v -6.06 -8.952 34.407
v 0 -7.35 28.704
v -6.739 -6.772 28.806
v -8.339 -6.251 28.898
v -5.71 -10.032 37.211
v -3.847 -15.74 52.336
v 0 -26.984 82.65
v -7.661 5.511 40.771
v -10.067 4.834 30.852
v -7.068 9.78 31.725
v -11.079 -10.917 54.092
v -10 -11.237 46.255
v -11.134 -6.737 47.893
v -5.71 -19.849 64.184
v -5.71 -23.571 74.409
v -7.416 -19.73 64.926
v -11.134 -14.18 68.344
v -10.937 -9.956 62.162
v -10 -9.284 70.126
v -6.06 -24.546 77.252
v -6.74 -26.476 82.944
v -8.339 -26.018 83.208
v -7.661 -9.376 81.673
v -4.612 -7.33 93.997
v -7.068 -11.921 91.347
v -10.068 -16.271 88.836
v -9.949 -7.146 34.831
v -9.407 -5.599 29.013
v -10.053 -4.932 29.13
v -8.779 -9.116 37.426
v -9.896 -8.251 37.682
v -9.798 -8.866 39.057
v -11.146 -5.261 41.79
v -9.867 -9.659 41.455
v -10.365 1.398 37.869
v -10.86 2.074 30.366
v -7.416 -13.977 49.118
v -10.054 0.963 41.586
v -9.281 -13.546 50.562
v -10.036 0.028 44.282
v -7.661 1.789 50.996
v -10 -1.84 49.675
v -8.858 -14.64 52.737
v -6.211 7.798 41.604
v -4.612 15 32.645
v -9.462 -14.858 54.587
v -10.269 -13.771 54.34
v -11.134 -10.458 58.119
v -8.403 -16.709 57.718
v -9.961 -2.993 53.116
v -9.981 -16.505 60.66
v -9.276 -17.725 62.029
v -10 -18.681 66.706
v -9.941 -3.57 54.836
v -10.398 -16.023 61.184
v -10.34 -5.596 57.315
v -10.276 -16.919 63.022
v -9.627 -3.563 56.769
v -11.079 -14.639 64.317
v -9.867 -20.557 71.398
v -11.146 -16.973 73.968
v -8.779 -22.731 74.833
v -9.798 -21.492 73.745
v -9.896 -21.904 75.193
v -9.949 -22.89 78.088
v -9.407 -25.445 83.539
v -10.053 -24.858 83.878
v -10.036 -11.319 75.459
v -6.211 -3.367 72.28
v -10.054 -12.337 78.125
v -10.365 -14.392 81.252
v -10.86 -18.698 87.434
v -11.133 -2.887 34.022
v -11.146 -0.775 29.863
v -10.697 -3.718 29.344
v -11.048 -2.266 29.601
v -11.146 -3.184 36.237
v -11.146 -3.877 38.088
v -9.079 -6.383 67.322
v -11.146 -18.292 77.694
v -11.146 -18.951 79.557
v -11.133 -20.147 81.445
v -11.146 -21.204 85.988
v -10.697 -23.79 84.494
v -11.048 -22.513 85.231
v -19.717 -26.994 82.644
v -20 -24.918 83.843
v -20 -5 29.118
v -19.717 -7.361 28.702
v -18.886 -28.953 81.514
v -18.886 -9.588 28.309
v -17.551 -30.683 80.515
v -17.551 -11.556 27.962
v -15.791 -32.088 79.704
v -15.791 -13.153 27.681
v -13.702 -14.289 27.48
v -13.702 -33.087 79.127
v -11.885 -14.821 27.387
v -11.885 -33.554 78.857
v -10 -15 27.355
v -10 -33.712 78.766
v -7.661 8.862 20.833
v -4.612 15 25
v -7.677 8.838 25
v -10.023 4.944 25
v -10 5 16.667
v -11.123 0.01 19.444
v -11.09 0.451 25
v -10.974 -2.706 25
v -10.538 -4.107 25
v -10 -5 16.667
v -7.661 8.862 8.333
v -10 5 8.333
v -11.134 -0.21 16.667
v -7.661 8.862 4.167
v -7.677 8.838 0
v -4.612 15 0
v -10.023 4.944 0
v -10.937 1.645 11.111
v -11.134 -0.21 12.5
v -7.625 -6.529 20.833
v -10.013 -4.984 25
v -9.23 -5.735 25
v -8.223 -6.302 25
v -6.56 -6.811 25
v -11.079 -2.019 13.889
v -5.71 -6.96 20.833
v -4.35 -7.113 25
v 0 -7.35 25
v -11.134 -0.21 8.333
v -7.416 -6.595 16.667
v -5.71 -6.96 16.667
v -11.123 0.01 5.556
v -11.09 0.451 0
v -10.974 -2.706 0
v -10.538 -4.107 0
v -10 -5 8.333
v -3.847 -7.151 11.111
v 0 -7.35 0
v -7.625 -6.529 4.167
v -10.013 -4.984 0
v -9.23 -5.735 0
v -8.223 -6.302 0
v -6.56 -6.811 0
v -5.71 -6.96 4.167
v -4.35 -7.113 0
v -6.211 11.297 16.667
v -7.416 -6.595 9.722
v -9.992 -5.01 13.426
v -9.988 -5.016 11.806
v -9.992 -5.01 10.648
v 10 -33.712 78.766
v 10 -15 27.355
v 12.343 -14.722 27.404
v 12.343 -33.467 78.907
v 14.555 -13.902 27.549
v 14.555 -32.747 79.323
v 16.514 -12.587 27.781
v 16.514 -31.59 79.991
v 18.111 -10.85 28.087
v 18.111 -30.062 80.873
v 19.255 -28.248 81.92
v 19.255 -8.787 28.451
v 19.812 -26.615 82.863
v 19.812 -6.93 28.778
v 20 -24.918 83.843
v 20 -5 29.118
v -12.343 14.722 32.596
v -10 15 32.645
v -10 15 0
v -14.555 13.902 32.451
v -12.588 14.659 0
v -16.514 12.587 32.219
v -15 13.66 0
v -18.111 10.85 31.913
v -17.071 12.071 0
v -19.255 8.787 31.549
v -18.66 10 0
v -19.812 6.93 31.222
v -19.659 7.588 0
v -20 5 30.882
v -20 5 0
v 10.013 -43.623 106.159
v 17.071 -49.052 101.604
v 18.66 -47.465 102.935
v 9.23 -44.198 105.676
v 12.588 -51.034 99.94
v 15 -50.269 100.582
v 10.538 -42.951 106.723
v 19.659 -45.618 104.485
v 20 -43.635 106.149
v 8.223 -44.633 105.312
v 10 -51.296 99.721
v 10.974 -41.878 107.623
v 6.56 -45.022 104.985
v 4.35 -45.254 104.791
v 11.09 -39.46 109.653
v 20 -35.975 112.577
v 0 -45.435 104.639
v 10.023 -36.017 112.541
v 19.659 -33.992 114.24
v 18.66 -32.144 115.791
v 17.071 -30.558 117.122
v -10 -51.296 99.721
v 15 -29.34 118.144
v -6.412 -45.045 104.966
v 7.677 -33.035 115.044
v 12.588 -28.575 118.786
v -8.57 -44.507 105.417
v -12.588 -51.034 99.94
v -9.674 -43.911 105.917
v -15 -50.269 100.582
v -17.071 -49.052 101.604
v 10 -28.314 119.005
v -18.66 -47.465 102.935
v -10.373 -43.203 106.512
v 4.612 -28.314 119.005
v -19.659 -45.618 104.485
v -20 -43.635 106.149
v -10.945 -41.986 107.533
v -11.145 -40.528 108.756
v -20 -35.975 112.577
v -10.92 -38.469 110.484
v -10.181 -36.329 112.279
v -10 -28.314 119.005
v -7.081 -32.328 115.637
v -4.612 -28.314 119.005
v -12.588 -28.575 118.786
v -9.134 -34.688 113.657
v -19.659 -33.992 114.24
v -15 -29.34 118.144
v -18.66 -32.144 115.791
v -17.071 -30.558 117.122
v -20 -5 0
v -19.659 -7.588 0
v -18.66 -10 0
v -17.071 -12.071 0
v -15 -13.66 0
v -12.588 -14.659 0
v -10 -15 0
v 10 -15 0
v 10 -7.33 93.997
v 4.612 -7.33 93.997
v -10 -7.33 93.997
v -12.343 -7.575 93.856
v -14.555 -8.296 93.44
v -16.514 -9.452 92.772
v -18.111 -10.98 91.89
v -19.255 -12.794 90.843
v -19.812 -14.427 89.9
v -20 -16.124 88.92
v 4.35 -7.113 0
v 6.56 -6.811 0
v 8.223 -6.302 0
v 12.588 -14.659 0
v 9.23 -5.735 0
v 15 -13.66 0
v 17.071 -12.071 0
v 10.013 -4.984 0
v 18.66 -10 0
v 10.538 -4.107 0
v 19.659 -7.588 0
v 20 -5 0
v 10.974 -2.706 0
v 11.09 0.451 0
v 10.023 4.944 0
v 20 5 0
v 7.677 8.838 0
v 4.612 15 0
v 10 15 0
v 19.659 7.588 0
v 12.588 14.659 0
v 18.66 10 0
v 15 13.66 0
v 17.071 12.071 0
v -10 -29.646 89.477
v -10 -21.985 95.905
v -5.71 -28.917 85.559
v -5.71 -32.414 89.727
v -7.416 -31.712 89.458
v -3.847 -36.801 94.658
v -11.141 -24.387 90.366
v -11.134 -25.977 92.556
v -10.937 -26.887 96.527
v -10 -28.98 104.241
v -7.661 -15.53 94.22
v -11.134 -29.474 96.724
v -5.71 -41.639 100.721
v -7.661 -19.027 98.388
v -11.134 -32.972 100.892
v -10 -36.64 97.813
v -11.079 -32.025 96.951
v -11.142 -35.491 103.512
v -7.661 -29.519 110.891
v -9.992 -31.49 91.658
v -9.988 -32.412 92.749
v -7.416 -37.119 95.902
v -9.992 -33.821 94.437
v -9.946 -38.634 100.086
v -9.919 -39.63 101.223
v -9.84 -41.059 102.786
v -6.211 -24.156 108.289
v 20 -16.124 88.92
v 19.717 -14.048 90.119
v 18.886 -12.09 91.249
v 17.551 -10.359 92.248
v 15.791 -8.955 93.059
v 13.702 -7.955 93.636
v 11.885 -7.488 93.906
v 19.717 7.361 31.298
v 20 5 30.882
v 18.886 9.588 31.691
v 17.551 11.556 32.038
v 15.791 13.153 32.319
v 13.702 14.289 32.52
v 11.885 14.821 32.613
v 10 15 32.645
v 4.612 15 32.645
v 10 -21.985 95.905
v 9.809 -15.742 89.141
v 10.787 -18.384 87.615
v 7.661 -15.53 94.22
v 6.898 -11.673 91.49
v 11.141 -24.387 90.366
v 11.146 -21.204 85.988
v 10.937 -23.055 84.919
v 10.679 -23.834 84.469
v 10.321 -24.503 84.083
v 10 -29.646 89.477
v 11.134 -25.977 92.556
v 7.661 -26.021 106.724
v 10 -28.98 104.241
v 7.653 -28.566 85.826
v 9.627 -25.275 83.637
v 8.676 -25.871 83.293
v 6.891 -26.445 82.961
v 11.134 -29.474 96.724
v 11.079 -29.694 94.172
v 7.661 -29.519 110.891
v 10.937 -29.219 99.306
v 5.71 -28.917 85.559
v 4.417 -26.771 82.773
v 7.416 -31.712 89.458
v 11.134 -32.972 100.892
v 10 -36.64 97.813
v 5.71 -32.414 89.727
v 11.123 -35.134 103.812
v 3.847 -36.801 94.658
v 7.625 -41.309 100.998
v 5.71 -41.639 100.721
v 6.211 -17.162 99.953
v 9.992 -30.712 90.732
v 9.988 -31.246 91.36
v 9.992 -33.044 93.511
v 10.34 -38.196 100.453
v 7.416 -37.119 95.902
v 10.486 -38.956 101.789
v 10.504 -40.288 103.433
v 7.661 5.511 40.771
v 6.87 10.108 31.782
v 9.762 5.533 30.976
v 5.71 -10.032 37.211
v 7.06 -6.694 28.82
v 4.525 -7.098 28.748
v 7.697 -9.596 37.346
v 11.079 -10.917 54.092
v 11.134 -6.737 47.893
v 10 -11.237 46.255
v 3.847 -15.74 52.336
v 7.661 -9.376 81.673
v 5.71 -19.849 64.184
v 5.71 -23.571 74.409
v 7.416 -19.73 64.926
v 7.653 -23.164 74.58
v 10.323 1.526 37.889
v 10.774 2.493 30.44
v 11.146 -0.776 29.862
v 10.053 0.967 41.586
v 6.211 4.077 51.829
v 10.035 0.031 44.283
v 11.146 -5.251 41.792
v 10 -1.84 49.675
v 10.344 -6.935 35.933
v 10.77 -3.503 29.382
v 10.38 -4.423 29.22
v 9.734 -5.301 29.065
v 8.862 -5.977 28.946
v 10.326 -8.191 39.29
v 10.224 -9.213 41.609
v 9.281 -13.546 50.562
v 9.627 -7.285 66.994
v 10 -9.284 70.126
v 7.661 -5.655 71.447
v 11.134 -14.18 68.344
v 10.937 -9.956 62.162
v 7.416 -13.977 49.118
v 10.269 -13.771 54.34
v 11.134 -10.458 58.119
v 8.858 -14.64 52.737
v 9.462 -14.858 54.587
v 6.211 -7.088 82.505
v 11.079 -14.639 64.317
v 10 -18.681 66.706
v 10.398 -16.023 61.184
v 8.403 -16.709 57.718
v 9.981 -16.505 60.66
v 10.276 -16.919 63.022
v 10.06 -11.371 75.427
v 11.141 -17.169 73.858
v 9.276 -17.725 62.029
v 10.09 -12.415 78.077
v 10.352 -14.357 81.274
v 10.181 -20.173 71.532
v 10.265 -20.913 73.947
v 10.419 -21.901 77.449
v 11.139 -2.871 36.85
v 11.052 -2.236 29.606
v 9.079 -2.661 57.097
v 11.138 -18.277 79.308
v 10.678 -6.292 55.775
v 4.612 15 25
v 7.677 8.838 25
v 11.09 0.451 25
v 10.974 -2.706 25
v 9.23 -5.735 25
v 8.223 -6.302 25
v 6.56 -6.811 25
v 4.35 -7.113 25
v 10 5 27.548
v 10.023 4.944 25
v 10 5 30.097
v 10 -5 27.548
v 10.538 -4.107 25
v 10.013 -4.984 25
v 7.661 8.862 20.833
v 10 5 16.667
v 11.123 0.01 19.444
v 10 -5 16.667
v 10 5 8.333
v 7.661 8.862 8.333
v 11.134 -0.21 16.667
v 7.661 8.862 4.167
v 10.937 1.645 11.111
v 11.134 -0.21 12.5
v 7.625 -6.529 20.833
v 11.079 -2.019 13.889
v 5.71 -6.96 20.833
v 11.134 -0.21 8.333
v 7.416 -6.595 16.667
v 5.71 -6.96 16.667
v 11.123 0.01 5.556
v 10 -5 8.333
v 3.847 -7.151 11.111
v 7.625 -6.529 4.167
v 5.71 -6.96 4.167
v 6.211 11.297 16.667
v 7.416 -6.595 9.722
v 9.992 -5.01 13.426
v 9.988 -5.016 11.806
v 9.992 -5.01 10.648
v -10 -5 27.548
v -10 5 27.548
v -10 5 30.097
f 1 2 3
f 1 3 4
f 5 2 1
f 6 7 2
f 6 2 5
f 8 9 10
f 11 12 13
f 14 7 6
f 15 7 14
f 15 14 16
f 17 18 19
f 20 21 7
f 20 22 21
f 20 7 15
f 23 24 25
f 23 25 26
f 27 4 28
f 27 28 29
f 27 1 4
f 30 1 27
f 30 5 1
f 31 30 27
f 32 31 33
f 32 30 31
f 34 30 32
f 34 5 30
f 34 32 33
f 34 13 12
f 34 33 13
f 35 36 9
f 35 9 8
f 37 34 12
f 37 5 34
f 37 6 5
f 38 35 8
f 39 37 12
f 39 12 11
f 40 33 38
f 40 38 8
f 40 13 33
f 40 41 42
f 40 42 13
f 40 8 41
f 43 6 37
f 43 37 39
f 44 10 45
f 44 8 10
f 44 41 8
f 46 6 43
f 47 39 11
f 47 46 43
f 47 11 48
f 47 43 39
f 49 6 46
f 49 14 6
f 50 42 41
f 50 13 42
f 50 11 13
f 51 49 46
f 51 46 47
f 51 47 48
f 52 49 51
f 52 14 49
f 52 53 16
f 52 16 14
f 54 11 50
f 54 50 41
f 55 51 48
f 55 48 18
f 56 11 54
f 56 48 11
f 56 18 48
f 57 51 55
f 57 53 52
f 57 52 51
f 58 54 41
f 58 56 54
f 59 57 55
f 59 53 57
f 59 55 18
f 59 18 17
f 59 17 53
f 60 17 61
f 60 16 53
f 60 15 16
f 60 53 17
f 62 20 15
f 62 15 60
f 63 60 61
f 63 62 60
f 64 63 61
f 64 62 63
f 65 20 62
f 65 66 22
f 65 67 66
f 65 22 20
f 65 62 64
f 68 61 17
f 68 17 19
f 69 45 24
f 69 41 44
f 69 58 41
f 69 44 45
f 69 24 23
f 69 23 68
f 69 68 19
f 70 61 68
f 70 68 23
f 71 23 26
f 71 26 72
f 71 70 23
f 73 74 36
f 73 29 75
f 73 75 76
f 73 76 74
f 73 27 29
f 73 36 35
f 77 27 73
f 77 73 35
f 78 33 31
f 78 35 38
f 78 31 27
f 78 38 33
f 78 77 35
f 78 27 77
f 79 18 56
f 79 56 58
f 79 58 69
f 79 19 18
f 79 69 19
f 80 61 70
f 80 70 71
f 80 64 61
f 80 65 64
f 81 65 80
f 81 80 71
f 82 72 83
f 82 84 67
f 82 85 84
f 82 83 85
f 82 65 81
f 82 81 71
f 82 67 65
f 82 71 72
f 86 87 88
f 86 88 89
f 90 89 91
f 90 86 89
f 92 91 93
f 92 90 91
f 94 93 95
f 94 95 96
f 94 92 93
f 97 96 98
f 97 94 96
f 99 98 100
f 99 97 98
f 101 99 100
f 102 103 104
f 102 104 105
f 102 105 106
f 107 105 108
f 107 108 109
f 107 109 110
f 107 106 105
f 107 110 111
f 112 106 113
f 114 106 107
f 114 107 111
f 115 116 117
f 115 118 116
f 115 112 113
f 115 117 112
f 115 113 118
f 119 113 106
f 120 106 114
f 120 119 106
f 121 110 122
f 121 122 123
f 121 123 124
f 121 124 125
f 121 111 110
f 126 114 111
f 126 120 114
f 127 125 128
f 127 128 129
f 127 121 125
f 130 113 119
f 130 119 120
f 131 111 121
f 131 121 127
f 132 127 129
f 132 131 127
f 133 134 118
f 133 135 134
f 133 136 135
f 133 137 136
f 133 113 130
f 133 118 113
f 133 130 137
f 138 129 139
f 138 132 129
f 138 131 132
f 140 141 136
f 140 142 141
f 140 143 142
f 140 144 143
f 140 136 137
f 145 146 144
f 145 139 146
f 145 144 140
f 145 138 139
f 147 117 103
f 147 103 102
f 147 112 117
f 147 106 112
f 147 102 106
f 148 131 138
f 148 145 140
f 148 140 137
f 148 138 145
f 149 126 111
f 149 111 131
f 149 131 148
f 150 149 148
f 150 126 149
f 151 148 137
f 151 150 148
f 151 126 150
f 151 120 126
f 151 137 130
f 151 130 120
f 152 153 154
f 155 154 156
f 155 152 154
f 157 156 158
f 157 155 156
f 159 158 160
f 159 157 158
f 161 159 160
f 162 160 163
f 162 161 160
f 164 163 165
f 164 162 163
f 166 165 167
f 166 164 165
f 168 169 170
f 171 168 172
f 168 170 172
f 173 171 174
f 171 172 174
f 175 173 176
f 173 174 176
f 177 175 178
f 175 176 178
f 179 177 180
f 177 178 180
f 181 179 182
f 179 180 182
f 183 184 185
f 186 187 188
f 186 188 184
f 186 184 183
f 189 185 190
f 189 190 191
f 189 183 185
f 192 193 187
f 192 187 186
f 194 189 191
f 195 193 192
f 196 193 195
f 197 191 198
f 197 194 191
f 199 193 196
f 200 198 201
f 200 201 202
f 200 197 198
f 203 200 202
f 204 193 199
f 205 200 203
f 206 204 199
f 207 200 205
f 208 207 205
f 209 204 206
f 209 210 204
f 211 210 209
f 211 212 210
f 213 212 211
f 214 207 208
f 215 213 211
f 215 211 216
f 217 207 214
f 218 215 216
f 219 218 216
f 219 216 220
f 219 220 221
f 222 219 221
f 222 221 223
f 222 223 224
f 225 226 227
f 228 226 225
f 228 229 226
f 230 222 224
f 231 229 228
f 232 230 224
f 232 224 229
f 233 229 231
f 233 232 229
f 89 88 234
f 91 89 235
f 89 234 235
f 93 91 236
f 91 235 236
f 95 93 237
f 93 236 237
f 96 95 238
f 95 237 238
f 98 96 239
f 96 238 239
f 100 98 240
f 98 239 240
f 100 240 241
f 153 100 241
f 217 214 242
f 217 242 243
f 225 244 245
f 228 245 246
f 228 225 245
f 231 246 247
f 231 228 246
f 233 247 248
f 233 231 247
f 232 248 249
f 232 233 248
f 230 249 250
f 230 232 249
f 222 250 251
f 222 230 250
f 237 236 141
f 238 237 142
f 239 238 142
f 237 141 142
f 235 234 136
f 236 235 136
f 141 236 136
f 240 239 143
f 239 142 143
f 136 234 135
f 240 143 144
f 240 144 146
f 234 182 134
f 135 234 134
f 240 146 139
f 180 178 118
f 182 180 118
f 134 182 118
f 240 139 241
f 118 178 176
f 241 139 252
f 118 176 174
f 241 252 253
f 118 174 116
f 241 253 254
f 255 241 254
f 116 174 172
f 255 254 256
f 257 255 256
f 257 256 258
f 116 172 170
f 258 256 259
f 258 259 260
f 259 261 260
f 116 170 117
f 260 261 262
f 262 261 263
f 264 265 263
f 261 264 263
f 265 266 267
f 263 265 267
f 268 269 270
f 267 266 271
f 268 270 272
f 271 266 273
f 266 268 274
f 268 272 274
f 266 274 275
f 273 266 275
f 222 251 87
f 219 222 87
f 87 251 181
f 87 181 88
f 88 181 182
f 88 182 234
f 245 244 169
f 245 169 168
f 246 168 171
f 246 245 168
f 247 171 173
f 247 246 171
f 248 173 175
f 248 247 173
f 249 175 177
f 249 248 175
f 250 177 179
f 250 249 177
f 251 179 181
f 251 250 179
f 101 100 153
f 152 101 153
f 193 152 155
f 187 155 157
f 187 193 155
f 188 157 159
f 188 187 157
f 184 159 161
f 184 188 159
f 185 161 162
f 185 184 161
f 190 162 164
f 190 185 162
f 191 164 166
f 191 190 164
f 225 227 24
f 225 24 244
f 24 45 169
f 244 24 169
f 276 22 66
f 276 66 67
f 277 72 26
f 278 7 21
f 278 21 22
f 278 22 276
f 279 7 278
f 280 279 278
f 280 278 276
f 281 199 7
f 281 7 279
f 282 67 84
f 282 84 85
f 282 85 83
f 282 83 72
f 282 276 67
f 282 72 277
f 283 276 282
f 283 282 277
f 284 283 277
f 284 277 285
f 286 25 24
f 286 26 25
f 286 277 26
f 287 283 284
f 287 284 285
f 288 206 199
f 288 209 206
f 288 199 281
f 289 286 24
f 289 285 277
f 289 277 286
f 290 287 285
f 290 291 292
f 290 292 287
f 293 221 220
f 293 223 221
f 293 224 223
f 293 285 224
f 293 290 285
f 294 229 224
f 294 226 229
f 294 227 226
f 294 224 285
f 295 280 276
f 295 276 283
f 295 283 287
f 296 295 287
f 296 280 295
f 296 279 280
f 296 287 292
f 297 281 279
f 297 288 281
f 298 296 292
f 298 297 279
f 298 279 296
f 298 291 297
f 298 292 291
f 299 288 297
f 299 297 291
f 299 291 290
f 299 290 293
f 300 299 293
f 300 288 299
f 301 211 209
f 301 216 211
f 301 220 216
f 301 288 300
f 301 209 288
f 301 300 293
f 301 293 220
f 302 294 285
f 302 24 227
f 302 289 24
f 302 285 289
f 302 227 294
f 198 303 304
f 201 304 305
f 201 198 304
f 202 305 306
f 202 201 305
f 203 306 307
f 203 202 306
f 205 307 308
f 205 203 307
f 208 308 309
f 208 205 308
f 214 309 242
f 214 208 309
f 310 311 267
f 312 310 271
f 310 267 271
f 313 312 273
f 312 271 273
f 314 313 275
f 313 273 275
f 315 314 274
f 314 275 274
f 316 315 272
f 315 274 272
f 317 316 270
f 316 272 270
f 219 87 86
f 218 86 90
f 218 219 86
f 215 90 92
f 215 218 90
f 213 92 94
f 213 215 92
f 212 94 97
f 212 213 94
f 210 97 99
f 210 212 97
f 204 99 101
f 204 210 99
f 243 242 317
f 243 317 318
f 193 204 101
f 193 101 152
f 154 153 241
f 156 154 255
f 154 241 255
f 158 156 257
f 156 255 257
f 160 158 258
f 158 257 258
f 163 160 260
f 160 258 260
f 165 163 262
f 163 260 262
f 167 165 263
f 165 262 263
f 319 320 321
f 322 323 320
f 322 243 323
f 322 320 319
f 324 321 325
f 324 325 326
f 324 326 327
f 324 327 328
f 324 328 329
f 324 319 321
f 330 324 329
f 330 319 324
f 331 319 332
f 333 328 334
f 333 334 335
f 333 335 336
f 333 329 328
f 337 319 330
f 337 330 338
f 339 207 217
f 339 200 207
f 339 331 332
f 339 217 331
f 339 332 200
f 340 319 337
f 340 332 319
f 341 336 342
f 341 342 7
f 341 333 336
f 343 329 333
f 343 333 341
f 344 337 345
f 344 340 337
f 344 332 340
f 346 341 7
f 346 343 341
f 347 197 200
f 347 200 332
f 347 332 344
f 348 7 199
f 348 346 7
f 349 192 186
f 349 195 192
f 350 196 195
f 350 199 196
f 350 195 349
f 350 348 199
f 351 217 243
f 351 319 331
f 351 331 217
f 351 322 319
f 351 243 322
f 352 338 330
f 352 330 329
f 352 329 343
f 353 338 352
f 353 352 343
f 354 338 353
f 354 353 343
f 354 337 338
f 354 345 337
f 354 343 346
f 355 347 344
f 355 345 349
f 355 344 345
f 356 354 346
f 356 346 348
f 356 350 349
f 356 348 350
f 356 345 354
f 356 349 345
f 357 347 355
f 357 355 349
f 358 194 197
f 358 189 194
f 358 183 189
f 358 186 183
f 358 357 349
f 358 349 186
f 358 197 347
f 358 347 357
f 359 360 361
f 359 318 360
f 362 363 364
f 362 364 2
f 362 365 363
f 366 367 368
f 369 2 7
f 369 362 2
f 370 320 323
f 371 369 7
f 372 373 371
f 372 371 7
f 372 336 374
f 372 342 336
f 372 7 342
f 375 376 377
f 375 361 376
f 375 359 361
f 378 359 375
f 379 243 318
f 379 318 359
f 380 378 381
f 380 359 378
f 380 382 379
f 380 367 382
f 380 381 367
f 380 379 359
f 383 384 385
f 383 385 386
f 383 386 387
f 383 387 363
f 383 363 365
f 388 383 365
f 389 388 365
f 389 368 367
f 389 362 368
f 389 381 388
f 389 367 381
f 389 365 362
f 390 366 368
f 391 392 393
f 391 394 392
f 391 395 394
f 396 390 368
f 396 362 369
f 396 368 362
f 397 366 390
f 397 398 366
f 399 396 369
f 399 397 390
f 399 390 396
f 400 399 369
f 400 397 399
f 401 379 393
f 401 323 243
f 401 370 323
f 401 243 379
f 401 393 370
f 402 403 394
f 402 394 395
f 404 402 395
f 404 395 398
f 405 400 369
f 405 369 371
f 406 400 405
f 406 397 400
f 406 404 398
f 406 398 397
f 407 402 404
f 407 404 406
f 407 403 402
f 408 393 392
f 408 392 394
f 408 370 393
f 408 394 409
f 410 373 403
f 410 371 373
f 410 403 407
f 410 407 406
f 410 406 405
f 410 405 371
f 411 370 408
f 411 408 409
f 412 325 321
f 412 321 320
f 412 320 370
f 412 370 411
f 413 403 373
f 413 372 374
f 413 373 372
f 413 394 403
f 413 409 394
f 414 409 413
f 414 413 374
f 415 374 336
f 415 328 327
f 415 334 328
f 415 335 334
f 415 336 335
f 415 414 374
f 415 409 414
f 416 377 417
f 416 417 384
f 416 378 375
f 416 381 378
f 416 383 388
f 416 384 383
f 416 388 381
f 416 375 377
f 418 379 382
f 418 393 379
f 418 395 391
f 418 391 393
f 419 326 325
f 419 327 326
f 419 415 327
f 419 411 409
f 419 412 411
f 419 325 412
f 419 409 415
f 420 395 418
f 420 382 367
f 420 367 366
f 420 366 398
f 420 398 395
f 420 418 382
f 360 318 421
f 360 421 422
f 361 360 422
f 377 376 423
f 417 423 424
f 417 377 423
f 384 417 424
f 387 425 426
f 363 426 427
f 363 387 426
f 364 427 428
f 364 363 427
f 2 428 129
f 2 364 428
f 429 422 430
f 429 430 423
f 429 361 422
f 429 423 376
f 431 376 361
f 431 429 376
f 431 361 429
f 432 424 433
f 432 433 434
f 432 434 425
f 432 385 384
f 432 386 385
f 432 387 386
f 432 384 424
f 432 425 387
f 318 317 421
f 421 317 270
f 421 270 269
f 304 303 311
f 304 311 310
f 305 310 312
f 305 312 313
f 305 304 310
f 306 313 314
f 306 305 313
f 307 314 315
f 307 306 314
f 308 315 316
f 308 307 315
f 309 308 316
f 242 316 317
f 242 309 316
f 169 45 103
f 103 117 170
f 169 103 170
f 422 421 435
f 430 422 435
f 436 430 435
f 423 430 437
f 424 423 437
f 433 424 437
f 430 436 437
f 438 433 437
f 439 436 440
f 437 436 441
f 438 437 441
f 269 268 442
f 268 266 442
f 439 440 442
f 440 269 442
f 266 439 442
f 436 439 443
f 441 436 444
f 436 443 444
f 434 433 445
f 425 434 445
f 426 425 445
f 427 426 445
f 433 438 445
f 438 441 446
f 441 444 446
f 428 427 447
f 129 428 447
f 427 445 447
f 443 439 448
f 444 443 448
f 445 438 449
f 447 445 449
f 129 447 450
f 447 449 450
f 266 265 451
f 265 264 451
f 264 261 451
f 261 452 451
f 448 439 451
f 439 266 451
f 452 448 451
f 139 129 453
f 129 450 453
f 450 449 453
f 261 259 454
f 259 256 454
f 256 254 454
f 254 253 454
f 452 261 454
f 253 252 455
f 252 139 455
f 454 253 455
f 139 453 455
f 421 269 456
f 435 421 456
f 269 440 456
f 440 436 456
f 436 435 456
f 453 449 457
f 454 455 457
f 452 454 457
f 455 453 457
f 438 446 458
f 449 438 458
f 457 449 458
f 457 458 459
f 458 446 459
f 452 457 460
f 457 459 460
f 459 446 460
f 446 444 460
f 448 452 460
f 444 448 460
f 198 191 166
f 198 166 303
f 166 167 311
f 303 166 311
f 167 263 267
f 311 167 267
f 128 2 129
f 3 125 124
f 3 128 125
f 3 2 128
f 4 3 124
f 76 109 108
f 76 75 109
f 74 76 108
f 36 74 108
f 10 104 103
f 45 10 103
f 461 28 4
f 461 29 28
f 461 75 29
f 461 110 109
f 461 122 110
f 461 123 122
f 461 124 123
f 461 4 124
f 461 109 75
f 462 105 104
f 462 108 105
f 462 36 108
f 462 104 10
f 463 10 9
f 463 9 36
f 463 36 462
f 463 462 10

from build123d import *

# Parameters (mm, degrees)
F2_DEPTH = 25


with BuildPart() as f2:
    # F0 (on Top) → F2 (new body)
    with BuildSketch(Plane.XY):
        with BuildLine():
            Line((-4.6122563072, 15), (-10, 15))
            ThreePointArc((-10, 15), (-17.0710678119, 12.0710678119), (-20, 5))
            Line((-20, 5), (-20, -5))
            ThreePointArc((-20, -5), (-17.0710678119, -12.0710678119), (-10, -15))
            Line((-10, -15), (10, -15))
            ThreePointArc((10, -15), (17.0710678119, -12.0710678119), (20, -5))
            Line((20, -5), (20, 5))
            ThreePointArc((20, 5), (17.0710678119, 12.0710678119), (10, 15))
            Line((10, 15), (4.6122563072, 15))
            add(Edge.make_bspline(
                [(4.6122563072, 15), (6.8289469928, 8.9060682803), (10.5117220245, 7.2656945751), (12.4788450791, -7.5751167321), (3.7502092309, -7.1033691056), (0, -7.3496685363)],
                knots=[0, 0, 0, 0, 0.3461122042, 0.6708599201, 1, 1, 1, 1], degree=3))
            add(Edge.make_bspline(
                [(-4.6122563072, 15), (-6.8289469928, 8.9060682803), (-10.5117220245, 7.2656945751), (-12.4788450791, -7.5751167321), (-3.7502092309, -7.1033691056), (0, -7.3496685363)],
                knots=[0, 0, 0, 0, 0.3461122042, 0.6708599201, 1, 1, 1, 1], degree=3))
        make_face()
    extrude(amount=F2_DEPTH)

    # F3: sweep along a path in F1
    with BuildLine(Plane.YZ) as f3_path:
        Line((0, 0), (0, 30))
        Line((0, 30), (-20.5212085995, 86.3815572472))
        Line((-20.5212085995, 86.3815572472), (-39.8048368901, 109.3628905407))
    # F0 (on Top) → F3 (sweep)
    with BuildSketch(Plane.XY):
        with BuildLine():
            Line((-4.6122563072, 15), (-10, 15))
            ThreePointArc((-10, 15), (-17.0710678119, 12.0710678119), (-20, 5))
            Line((-20, 5), (-20, -5))
            ThreePointArc((-20, -5), (-17.0710678119, -12.0710678119), (-10, -15))
            Line((-10, -15), (10, -15))
            ThreePointArc((10, -15), (17.0710678119, -12.0710678119), (20, -5))
            Line((20, -5), (20, 5))
            ThreePointArc((20, 5), (17.0710678119, 12.0710678119), (10, 15))
            Line((10, 15), (4.6122563072, 15))
            add(Edge.make_bspline(
                [(4.6122563072, 15), (6.8289469928, 8.9060682803), (10.5117220245, 7.2656945751), (12.4788450791, -7.5751167321), (3.7502092309, -7.1033691056), (0, -7.3496685363)],
                knots=[0, 0, 0, 0, 0.3461122042, 0.6708599201, 1, 1, 1, 1], degree=3))
            add(Edge.make_bspline(
                [(-4.6122563072, 15), (-6.8289469928, 8.9060682803), (-10.5117220245, 7.2656945751), (-12.4788450791, -7.5751167321), (-3.7502092309, -7.1033691056), (0, -7.3496685363)],
                knots=[0, 0, 0, 0, 0.3461122042, 0.6708599201, 1, 1, 1, 1], degree=3))
        make_face()
    sweep(path=f3_path.line, transition=Transition.RIGHT)


solid = f2.part
